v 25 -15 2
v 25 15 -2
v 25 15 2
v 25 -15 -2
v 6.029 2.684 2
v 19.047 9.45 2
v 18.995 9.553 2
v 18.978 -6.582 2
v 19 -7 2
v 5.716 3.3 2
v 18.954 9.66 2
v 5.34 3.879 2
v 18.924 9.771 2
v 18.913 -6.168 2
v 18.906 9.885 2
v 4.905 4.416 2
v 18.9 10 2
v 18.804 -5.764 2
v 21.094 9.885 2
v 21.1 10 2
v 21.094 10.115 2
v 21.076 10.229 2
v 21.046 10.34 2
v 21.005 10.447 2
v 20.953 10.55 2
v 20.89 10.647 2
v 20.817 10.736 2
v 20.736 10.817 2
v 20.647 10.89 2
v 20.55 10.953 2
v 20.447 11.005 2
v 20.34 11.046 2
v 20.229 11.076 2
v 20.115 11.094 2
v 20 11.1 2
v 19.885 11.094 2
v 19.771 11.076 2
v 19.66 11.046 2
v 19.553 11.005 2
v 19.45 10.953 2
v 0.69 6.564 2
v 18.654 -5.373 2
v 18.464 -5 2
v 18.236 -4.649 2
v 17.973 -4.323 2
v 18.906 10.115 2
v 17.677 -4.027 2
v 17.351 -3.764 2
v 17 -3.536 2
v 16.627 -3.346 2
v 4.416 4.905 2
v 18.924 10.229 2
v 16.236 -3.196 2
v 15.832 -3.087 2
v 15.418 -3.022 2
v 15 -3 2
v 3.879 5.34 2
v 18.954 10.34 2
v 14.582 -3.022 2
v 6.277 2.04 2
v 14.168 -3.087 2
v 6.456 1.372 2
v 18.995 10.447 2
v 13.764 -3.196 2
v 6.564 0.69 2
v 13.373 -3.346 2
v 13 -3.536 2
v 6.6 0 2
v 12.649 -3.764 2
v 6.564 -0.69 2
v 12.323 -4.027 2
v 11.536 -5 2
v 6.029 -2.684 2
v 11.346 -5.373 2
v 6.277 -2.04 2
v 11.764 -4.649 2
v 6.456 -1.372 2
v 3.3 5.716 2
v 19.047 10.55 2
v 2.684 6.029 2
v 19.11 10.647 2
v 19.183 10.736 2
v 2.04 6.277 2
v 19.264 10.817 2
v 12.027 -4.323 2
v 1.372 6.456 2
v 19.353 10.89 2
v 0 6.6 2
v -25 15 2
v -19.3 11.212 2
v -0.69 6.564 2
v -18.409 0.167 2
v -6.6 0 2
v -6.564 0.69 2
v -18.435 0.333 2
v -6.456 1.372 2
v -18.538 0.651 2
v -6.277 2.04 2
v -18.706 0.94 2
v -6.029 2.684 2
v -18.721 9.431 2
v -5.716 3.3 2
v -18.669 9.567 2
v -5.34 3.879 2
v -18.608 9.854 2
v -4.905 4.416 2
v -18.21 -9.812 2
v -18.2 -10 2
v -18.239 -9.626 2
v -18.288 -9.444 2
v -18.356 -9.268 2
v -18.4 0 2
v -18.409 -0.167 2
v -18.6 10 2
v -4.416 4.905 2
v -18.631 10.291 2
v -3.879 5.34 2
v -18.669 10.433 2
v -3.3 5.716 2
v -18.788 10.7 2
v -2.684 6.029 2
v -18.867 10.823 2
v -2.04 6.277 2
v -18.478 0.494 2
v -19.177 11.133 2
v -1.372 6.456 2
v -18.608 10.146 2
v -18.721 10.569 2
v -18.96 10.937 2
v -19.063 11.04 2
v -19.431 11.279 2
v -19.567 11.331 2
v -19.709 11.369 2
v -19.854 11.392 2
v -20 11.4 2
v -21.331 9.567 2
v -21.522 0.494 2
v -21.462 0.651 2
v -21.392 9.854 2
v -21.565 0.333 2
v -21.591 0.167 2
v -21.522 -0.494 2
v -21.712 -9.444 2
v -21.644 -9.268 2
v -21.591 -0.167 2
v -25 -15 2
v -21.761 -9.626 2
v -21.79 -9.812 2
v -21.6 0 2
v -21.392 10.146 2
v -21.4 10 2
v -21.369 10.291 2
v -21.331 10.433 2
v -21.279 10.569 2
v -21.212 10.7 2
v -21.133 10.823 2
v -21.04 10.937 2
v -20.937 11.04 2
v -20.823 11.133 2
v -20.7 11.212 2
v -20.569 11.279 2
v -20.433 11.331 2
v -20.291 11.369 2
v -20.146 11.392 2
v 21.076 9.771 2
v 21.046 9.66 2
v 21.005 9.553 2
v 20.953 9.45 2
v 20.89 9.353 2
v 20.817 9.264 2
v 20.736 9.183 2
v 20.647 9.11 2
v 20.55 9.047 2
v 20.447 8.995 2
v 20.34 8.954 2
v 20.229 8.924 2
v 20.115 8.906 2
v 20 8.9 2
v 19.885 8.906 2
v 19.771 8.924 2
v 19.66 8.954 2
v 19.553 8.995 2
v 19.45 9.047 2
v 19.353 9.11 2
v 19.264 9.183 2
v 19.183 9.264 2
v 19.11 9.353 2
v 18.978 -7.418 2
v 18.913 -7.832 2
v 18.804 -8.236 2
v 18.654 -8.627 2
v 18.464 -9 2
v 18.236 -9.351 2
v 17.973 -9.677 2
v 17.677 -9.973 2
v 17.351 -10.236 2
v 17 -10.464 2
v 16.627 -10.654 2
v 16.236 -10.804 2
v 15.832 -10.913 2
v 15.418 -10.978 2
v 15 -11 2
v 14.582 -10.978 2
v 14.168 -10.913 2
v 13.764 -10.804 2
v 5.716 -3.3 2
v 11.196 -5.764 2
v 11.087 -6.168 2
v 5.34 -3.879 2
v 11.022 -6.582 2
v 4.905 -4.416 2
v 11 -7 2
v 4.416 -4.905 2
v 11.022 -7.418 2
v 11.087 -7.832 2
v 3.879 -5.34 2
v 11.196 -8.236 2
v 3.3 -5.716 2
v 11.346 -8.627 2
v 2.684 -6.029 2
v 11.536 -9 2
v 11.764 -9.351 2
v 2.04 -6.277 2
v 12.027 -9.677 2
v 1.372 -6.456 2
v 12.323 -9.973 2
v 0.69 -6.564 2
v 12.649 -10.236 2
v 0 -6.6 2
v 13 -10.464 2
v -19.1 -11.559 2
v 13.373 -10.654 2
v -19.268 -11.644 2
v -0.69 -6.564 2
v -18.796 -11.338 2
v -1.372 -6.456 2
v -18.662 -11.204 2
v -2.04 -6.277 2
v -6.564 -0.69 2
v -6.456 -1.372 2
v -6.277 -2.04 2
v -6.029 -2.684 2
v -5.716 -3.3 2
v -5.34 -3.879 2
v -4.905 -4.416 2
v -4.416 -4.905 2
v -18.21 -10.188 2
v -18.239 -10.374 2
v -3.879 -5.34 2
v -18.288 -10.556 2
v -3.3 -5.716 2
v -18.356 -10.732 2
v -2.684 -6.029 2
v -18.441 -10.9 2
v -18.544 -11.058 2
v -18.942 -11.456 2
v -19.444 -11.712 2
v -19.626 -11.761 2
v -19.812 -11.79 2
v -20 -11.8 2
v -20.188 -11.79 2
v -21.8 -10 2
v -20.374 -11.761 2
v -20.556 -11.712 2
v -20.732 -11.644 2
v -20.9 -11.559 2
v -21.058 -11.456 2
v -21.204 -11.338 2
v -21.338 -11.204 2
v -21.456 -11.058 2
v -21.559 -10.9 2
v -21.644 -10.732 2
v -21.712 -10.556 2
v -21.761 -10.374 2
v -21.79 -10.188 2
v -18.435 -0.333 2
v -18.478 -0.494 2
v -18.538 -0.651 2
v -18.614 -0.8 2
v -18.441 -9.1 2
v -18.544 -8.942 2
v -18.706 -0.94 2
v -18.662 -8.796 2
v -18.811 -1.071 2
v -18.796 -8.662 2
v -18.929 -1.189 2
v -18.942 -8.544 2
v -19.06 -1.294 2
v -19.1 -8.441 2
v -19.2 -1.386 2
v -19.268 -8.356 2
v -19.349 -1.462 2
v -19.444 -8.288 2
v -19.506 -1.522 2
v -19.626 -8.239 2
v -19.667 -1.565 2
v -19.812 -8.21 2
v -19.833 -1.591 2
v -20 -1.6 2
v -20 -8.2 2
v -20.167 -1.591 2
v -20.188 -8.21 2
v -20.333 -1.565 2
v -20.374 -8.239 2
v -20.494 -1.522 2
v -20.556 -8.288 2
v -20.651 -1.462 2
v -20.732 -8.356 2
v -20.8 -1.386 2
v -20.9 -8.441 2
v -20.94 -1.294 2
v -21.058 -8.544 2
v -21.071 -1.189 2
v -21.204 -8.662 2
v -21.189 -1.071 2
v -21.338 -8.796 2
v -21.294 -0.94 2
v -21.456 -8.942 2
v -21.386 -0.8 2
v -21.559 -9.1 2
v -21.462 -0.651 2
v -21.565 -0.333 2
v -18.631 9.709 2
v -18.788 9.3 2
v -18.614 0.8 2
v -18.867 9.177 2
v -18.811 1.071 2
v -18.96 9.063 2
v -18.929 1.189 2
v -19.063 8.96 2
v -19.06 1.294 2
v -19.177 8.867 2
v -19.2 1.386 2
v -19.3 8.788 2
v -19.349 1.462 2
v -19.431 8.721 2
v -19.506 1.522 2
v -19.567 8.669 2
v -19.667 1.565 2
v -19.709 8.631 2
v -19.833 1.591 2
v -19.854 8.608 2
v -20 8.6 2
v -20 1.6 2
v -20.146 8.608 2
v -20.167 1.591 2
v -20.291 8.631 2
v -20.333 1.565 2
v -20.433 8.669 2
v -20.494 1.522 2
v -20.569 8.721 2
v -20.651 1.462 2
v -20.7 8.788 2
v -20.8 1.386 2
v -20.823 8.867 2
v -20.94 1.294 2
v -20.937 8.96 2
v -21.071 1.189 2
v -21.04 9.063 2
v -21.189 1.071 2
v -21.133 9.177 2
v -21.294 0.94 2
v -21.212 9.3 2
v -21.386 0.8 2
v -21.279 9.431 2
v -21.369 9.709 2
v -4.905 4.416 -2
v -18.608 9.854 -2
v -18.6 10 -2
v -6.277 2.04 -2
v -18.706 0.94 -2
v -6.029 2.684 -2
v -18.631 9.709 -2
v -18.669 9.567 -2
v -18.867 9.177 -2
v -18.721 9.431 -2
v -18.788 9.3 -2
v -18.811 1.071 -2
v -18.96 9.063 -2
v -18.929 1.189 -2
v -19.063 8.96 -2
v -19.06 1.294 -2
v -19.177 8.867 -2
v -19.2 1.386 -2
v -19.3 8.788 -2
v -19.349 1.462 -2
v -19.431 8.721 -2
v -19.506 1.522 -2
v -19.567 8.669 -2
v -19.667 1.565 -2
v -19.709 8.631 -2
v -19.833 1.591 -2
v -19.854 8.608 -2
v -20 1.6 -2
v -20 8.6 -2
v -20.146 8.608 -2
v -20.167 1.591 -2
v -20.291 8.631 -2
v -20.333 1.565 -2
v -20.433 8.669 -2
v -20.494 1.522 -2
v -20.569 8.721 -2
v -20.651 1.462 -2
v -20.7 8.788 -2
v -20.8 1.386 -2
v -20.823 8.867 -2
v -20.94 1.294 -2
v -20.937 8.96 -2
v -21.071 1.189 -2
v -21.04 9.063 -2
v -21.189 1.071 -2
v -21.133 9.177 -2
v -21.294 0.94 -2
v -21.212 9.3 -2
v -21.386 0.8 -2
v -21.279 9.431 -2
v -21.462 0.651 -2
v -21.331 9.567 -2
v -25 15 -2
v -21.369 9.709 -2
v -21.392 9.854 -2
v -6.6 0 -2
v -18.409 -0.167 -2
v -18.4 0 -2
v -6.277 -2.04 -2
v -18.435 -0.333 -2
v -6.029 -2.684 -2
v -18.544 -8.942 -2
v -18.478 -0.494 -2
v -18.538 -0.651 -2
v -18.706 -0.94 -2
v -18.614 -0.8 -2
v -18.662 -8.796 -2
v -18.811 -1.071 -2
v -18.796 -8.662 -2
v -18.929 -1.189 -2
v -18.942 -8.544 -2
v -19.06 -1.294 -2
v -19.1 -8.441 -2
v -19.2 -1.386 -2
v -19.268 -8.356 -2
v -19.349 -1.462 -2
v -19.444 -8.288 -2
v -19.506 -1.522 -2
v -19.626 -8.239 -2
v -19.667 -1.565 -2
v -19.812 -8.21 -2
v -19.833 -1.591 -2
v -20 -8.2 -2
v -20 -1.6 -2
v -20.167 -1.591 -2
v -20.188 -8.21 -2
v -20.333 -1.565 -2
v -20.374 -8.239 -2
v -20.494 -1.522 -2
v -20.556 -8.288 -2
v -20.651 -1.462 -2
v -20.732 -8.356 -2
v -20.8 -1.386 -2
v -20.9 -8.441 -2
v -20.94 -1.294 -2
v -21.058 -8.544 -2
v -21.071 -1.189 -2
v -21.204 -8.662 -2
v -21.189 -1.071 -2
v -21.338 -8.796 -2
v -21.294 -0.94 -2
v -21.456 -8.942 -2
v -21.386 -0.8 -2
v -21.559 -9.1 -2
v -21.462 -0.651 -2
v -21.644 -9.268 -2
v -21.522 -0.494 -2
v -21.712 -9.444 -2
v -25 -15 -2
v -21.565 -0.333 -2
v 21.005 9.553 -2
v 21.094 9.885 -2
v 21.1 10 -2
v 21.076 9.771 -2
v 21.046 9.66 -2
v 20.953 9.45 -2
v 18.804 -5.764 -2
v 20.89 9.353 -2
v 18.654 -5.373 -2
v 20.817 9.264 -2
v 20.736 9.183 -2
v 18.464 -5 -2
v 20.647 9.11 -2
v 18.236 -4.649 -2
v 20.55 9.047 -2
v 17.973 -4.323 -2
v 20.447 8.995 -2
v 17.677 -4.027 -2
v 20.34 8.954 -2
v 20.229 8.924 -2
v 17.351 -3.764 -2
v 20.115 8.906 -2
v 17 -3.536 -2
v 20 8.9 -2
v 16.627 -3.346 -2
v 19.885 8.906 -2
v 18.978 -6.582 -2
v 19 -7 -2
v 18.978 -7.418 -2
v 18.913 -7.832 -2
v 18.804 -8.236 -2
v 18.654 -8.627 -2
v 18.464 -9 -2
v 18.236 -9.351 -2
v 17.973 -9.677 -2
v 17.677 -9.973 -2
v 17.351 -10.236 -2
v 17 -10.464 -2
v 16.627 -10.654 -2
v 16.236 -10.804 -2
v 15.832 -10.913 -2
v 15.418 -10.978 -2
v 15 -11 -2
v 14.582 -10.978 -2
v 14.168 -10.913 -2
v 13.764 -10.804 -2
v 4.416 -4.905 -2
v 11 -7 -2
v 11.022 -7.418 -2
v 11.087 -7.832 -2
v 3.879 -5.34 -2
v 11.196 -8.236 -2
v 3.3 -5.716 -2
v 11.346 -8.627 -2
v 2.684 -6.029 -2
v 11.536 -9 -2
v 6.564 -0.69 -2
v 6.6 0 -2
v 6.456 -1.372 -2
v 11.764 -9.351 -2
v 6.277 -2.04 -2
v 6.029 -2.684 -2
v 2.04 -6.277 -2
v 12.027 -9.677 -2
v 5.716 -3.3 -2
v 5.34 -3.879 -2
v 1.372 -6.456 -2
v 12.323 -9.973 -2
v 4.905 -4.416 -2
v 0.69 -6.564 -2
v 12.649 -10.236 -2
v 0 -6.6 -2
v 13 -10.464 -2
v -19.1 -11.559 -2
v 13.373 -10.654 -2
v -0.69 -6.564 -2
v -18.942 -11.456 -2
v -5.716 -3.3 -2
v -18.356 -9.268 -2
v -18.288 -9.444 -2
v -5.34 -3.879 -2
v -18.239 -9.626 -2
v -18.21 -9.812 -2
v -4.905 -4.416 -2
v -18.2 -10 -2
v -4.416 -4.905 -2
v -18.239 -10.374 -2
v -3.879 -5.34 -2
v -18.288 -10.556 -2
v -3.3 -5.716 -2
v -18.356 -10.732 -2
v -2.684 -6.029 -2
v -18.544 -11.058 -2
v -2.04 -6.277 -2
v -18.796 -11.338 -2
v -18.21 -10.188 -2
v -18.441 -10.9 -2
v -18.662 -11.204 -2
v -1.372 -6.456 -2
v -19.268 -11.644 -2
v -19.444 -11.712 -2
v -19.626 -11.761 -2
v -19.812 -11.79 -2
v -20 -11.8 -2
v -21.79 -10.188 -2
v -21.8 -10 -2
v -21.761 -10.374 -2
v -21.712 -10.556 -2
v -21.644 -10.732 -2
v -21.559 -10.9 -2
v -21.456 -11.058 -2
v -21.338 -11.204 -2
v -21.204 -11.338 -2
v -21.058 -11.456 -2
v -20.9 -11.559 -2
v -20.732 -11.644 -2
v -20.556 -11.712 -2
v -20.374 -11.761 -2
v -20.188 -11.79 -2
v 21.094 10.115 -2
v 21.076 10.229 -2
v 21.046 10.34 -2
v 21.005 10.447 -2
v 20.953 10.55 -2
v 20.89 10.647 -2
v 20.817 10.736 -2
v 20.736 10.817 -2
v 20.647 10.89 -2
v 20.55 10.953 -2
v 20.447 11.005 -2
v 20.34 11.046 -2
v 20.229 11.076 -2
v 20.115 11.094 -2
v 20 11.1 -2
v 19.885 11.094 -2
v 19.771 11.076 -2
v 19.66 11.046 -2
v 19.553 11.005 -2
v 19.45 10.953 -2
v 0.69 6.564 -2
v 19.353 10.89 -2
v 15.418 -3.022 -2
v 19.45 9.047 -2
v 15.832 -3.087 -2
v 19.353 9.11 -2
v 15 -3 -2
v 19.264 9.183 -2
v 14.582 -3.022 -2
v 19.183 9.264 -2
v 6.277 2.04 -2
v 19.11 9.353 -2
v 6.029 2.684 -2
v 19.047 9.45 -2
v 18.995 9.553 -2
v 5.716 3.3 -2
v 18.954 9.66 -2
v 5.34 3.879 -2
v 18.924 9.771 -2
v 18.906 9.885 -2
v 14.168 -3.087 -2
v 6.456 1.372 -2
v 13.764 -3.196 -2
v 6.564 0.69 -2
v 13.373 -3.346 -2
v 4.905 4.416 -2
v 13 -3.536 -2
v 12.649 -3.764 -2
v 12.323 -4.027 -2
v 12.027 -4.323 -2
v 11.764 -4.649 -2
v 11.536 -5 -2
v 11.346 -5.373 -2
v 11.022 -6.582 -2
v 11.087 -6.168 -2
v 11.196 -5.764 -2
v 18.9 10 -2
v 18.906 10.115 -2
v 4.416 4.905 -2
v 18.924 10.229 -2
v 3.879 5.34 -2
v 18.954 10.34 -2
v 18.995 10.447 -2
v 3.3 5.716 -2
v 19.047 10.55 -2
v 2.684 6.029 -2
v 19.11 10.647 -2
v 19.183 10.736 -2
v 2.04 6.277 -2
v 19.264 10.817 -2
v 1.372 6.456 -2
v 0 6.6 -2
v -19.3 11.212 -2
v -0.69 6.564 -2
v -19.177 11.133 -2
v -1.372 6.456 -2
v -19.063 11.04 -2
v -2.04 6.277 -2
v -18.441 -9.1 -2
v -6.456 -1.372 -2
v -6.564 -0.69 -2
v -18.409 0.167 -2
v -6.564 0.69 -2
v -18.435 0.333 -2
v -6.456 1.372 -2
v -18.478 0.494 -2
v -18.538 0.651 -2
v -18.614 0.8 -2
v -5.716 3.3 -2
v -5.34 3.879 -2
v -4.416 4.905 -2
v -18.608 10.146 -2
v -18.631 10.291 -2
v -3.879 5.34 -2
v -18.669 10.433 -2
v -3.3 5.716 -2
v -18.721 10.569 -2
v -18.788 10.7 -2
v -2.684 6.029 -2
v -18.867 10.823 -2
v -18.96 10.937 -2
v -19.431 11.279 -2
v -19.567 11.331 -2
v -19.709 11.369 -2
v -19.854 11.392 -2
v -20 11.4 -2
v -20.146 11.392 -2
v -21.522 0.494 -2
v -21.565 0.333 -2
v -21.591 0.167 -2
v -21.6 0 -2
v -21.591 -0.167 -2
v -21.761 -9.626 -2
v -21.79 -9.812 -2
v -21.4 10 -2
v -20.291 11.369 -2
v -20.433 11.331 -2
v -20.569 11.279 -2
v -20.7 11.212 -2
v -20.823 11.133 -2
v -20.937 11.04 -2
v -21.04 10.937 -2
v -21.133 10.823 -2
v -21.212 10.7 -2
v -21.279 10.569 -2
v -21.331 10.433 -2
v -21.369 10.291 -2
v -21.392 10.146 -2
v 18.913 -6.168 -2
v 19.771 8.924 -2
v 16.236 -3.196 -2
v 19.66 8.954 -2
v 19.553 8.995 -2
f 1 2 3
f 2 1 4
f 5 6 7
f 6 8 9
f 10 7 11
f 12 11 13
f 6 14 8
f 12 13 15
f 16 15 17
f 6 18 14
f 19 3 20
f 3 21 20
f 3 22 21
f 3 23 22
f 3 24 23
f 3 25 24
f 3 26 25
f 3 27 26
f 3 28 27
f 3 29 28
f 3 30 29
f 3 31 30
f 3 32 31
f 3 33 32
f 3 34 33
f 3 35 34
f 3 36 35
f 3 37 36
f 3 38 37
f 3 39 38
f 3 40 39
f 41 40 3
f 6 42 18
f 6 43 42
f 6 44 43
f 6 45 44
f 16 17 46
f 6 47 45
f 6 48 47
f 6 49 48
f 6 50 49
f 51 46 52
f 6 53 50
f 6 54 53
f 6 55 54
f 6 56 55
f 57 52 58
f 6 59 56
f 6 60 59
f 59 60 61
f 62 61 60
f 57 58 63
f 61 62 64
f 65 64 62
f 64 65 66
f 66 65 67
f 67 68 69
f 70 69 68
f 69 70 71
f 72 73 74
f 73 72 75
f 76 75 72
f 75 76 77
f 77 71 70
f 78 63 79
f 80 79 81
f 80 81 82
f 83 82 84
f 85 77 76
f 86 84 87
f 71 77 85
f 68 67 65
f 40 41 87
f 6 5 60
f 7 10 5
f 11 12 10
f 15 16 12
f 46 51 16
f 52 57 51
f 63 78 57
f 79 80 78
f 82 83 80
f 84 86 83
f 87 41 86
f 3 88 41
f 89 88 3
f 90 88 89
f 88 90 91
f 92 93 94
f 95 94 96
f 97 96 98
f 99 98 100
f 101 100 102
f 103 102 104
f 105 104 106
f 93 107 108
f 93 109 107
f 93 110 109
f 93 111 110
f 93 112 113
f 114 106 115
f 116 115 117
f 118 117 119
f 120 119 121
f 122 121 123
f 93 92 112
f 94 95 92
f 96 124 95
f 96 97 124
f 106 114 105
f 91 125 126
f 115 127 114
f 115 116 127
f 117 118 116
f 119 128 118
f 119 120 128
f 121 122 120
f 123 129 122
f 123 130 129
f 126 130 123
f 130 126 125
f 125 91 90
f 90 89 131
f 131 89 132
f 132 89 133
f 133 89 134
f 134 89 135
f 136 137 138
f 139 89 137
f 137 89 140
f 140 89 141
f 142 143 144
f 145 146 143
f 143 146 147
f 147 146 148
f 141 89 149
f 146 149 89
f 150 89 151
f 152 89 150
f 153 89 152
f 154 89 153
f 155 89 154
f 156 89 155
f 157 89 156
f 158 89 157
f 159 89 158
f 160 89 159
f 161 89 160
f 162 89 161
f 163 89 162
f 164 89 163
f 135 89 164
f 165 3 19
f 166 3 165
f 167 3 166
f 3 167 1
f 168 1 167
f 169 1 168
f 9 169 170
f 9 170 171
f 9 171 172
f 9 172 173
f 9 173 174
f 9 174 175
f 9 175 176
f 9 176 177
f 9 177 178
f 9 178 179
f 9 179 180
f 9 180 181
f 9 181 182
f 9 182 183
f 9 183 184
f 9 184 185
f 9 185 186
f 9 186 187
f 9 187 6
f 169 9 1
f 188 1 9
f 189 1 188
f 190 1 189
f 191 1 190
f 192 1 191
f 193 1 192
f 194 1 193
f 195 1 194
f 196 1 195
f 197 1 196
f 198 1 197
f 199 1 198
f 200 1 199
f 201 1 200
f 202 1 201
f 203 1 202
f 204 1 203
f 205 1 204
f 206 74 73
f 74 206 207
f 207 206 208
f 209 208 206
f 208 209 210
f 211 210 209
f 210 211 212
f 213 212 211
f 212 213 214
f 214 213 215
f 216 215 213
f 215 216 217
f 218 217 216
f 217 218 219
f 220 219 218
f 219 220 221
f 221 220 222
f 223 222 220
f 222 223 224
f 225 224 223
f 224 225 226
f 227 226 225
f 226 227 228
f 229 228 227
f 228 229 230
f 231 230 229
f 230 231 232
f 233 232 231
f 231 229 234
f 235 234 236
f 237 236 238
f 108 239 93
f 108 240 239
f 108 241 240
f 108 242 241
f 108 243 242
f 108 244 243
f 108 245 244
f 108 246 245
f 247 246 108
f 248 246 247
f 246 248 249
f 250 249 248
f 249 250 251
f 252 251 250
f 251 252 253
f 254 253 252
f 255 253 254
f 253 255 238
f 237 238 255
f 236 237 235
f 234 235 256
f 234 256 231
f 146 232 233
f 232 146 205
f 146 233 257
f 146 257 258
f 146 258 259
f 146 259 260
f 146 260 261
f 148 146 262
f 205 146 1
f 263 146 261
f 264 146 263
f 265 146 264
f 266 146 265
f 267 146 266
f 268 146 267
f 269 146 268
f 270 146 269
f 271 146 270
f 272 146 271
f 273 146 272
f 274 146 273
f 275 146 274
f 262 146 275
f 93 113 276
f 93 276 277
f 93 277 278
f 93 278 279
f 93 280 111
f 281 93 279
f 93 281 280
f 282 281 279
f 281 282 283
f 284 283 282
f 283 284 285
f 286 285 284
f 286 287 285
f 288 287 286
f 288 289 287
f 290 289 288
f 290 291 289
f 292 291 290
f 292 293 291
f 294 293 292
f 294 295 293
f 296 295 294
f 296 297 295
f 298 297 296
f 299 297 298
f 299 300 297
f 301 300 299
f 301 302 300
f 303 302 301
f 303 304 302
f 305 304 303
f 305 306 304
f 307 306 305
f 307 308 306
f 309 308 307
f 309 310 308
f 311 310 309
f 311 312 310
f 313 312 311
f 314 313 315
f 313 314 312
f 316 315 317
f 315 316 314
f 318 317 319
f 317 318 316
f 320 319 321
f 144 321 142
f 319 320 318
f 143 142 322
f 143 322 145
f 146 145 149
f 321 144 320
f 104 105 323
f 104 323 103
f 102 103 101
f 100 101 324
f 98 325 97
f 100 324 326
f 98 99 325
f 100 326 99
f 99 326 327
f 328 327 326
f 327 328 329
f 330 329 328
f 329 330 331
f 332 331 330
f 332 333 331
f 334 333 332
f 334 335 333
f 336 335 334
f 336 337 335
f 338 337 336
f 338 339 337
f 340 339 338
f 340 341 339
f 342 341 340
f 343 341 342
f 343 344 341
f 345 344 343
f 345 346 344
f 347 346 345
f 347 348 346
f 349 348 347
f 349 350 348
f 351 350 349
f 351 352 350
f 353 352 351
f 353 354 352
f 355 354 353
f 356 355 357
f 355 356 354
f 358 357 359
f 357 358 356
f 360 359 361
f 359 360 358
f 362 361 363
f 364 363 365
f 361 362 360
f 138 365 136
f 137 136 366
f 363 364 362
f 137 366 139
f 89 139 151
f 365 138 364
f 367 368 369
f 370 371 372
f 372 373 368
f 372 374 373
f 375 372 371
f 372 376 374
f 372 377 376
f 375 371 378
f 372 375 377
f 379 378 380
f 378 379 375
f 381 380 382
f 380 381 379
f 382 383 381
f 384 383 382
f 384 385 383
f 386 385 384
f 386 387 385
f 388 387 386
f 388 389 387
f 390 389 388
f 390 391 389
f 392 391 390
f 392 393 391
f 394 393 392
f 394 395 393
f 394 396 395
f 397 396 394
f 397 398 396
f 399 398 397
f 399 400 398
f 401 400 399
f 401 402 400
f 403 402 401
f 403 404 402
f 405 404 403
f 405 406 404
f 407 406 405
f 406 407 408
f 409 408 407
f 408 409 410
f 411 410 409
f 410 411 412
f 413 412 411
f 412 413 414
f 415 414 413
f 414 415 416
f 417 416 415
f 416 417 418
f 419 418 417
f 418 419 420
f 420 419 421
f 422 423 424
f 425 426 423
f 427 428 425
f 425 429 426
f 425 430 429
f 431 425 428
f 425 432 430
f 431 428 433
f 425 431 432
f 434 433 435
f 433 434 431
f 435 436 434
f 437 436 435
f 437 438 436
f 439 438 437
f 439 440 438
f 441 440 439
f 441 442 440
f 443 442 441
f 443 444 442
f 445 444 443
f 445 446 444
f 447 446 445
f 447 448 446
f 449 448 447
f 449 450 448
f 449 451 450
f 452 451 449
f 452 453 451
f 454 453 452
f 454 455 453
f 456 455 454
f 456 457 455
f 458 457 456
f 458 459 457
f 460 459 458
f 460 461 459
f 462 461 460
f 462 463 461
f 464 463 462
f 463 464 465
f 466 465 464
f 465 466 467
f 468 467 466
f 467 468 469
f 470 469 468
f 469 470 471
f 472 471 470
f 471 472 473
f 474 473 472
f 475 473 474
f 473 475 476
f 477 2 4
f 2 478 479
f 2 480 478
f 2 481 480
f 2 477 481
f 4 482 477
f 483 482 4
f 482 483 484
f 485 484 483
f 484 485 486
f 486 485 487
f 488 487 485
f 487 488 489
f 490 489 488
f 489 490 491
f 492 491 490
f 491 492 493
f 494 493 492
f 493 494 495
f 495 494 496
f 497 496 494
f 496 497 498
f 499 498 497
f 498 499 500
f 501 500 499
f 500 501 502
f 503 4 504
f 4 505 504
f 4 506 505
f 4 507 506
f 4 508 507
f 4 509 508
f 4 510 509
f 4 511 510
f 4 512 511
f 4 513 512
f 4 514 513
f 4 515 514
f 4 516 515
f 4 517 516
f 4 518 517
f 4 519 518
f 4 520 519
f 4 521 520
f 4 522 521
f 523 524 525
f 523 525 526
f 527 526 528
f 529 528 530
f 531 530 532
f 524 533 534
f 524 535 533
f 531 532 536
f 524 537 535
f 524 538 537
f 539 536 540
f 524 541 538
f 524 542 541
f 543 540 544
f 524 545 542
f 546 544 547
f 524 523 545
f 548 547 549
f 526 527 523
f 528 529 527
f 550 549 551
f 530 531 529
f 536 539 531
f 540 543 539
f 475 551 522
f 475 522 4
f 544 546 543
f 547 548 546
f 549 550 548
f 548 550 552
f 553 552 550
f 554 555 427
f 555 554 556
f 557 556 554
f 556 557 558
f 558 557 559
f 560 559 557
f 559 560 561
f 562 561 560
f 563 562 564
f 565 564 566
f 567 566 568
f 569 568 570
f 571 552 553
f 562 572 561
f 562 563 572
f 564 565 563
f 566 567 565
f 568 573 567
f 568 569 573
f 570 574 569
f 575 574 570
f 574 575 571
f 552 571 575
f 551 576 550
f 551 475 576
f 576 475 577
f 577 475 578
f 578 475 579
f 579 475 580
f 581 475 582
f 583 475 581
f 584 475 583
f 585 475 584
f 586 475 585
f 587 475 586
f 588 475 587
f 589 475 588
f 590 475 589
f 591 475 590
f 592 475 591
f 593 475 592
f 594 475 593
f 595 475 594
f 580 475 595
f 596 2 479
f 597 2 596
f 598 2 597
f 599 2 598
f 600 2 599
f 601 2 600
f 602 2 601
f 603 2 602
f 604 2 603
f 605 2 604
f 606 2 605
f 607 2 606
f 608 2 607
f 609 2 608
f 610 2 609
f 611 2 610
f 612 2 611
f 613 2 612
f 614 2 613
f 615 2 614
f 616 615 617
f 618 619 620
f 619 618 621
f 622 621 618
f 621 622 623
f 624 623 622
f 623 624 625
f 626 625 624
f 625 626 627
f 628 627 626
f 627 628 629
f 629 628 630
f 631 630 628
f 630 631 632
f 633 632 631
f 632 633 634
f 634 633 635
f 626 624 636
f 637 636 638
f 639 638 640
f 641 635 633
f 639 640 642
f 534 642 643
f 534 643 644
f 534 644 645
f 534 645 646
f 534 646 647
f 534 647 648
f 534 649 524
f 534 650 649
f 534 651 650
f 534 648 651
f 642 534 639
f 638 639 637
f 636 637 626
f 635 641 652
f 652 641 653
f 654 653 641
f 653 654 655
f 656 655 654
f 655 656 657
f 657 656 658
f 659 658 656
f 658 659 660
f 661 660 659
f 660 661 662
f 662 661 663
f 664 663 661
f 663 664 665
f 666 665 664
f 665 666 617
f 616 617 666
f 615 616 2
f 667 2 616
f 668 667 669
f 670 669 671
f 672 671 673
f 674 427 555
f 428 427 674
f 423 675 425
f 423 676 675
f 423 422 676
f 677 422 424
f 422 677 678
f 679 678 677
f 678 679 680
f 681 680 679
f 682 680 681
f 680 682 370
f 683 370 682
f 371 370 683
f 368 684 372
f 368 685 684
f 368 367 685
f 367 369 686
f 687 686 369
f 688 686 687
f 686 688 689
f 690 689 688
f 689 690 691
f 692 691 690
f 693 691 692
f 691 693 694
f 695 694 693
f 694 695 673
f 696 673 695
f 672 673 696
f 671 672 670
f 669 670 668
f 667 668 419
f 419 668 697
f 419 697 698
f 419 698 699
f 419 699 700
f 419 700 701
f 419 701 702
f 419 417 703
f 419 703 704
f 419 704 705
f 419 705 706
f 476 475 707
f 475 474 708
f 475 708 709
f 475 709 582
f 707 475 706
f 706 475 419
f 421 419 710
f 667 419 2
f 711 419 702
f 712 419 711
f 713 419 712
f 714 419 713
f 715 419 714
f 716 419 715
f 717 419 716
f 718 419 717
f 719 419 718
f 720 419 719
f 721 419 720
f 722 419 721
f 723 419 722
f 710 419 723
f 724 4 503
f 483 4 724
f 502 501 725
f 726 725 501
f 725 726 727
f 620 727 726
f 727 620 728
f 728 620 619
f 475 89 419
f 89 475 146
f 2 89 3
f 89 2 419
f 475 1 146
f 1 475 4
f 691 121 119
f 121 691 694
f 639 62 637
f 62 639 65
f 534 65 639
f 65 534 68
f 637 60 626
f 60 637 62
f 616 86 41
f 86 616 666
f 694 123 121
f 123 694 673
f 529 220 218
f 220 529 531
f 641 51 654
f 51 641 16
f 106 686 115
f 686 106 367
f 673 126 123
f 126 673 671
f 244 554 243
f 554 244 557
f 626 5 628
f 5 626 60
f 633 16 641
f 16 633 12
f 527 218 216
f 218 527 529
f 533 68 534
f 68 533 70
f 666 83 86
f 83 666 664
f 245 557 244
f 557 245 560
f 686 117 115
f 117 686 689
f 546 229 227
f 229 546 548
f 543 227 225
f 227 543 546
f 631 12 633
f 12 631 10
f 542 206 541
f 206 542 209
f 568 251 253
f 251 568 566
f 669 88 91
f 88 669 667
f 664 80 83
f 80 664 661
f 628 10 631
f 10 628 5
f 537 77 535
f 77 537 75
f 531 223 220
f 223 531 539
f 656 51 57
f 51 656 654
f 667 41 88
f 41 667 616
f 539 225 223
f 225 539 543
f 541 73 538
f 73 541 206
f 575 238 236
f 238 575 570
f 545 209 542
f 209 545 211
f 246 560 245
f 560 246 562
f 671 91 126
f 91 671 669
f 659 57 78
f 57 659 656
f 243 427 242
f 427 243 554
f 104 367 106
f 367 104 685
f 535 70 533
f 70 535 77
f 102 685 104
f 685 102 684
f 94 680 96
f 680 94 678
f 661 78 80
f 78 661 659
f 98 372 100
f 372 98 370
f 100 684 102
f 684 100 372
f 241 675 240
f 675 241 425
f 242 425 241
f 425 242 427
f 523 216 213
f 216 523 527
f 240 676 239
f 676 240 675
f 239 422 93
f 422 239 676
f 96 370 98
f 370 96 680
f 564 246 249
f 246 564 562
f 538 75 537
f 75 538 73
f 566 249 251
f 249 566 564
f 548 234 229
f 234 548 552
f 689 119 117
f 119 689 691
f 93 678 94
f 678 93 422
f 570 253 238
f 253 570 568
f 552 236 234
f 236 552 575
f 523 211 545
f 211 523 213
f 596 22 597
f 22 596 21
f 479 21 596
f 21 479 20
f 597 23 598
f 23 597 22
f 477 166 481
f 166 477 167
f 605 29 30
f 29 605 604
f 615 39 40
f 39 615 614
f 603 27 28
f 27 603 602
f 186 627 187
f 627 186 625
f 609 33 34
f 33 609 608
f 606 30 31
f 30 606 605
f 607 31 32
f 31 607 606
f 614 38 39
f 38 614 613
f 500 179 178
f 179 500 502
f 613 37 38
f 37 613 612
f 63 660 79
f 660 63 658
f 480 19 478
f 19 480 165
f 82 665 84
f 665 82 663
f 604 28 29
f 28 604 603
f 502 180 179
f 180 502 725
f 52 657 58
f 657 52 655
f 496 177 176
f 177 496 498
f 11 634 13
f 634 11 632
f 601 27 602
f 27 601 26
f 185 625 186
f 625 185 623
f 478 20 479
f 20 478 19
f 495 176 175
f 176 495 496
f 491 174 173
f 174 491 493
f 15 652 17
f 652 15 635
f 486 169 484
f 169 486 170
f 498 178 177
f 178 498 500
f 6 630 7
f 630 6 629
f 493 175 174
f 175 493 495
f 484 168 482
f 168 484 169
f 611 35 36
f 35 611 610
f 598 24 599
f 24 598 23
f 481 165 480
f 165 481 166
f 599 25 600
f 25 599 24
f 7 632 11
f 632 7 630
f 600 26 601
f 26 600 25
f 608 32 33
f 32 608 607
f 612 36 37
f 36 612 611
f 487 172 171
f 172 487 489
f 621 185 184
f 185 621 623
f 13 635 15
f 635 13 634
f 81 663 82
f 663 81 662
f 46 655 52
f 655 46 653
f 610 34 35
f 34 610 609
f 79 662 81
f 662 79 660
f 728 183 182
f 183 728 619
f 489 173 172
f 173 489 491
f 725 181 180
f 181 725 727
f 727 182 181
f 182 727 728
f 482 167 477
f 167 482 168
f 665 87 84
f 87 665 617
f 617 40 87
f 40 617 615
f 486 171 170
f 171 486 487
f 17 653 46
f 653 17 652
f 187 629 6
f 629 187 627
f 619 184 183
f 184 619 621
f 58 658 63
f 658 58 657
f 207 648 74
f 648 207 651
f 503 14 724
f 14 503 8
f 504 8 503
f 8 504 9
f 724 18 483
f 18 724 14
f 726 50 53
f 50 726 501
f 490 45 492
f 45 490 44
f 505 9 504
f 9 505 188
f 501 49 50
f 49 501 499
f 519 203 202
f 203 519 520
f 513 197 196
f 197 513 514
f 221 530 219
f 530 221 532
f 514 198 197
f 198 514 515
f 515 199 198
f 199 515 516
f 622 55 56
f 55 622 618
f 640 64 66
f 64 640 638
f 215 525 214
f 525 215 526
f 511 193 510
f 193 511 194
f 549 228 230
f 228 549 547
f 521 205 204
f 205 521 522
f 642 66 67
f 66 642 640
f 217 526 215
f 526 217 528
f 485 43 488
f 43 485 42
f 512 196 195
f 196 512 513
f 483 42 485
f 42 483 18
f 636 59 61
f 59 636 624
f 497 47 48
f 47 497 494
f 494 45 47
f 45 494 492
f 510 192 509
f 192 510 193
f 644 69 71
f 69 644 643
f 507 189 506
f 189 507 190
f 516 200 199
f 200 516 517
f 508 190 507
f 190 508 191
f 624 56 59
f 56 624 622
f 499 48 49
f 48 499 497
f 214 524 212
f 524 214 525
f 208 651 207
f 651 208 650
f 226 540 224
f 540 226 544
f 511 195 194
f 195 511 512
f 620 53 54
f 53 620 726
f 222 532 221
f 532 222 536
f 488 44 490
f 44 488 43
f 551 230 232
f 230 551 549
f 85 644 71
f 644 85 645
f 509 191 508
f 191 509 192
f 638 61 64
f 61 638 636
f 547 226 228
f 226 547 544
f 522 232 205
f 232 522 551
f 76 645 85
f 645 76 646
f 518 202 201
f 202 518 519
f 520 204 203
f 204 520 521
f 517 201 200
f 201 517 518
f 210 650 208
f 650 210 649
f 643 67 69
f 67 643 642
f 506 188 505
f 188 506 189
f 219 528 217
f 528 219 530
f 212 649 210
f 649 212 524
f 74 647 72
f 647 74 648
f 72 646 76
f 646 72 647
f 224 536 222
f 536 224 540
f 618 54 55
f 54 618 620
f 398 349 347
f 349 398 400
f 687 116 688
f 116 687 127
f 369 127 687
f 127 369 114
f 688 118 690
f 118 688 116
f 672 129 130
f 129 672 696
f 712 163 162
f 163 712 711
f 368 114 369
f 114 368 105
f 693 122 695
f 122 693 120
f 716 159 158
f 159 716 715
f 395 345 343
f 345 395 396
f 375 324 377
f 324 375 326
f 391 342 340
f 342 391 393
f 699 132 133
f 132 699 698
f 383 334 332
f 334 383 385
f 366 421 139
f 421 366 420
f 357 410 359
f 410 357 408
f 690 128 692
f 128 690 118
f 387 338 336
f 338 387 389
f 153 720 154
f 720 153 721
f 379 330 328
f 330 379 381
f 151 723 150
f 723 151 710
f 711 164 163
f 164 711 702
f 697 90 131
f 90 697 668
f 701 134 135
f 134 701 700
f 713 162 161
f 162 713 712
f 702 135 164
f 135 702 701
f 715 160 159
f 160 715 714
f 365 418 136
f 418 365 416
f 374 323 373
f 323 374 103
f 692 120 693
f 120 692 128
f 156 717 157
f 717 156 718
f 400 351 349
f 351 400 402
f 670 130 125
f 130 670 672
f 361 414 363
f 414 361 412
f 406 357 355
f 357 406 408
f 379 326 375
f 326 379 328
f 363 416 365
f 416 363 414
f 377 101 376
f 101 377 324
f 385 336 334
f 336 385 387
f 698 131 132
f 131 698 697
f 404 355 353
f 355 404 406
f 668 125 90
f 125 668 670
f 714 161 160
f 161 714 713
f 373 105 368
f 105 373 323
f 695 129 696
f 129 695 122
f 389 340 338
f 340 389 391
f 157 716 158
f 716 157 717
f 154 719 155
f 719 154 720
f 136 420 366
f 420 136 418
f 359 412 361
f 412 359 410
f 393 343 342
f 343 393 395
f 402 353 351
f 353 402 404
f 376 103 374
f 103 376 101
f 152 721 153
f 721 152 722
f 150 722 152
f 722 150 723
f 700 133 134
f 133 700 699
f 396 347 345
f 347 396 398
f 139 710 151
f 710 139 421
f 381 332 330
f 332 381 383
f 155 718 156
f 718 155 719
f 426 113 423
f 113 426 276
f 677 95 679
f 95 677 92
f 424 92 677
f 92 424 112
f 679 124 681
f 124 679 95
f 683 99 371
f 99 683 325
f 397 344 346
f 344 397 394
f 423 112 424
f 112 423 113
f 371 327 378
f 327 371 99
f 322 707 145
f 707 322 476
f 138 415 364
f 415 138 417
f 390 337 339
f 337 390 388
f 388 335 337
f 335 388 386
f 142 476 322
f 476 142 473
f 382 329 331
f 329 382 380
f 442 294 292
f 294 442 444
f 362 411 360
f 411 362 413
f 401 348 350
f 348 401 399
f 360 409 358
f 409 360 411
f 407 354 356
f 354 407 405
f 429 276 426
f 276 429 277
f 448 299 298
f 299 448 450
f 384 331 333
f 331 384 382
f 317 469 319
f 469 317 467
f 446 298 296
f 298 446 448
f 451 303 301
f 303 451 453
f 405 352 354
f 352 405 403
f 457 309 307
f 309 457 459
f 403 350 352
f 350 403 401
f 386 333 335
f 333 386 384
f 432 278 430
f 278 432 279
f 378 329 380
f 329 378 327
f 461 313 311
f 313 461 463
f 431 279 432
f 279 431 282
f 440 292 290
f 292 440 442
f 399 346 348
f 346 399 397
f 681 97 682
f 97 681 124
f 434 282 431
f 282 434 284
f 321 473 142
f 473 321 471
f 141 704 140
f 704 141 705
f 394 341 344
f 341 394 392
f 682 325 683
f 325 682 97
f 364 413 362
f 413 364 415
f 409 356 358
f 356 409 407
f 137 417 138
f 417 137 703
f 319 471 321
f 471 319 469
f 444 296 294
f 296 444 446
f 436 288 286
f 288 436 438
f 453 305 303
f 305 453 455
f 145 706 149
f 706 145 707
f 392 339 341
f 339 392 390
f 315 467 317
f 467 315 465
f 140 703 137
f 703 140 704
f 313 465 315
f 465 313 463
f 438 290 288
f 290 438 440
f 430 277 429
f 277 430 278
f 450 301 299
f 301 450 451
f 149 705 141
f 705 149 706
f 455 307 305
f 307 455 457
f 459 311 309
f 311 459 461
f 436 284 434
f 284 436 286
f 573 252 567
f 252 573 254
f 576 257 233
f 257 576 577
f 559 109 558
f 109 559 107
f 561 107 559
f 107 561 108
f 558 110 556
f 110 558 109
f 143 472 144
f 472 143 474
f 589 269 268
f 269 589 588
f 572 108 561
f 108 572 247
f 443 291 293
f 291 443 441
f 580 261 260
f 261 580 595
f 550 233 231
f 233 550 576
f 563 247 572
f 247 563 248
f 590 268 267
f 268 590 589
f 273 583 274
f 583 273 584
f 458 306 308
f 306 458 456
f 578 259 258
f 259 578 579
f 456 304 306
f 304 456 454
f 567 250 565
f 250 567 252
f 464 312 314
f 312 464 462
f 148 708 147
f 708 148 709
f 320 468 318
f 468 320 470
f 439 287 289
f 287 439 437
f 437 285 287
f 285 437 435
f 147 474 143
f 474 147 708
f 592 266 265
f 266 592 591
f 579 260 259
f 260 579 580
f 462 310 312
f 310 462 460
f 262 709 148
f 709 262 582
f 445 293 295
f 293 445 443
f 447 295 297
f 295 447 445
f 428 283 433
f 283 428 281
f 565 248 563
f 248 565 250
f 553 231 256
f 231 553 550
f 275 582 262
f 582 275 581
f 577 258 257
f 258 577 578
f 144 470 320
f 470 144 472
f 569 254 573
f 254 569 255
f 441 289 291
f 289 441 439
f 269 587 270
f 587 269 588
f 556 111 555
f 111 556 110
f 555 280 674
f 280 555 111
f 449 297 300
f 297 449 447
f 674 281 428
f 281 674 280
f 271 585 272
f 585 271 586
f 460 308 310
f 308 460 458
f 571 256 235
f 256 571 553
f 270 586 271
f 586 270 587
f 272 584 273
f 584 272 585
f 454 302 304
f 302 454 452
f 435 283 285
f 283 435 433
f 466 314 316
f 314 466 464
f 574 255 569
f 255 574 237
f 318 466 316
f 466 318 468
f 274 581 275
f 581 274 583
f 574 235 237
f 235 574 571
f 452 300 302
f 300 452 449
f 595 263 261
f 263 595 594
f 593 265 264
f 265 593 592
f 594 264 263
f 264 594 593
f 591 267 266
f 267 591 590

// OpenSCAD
$fn=60;
ROTARY_SHAFT_HOLE_RD = 8/2;
SELF_TAP_HOLE_RD = 2.2/2;
POW_SW_HOLE_RD = 3.2/2;
PUSH_BUTTON_HOLE_RD = 13.2/2;

TN = 4;
zof = -TN+1.5;

difference(){
    cube([50,30, TN], center=true);

    // button hole
    translate([0,0,zof]){
        cylinder(h = TN + 1, r = PUSH_BUTTON_HOLE_RD);
    }
    // self tapper hole
    translate([20,10,zof]){
        cylinder(h = TN + 1, r = SELF_TAP_HOLE_RD);
    }
    // rotary shaft hole
    translate([15,-7,zof]){
        cylinder(h = TN + 1, r = ROTARY_SHAFT_HOLE_RD);
    }

    // test m2.5 bush holes
    translate([-20,10,zof]){
        cylinder(h = TN + 1, r = POW_SW_HOLE_RD - 0.2);
    }
    translate([-20,0,zof]){
        cylinder(h = TN + 1, r = POW_SW_HOLE_RD);
    }
    translate([-20,-10,zof]){
        cylinder(h = TN + 1, r = POW_SW_HOLE_RD + 0.2);
    }


}
